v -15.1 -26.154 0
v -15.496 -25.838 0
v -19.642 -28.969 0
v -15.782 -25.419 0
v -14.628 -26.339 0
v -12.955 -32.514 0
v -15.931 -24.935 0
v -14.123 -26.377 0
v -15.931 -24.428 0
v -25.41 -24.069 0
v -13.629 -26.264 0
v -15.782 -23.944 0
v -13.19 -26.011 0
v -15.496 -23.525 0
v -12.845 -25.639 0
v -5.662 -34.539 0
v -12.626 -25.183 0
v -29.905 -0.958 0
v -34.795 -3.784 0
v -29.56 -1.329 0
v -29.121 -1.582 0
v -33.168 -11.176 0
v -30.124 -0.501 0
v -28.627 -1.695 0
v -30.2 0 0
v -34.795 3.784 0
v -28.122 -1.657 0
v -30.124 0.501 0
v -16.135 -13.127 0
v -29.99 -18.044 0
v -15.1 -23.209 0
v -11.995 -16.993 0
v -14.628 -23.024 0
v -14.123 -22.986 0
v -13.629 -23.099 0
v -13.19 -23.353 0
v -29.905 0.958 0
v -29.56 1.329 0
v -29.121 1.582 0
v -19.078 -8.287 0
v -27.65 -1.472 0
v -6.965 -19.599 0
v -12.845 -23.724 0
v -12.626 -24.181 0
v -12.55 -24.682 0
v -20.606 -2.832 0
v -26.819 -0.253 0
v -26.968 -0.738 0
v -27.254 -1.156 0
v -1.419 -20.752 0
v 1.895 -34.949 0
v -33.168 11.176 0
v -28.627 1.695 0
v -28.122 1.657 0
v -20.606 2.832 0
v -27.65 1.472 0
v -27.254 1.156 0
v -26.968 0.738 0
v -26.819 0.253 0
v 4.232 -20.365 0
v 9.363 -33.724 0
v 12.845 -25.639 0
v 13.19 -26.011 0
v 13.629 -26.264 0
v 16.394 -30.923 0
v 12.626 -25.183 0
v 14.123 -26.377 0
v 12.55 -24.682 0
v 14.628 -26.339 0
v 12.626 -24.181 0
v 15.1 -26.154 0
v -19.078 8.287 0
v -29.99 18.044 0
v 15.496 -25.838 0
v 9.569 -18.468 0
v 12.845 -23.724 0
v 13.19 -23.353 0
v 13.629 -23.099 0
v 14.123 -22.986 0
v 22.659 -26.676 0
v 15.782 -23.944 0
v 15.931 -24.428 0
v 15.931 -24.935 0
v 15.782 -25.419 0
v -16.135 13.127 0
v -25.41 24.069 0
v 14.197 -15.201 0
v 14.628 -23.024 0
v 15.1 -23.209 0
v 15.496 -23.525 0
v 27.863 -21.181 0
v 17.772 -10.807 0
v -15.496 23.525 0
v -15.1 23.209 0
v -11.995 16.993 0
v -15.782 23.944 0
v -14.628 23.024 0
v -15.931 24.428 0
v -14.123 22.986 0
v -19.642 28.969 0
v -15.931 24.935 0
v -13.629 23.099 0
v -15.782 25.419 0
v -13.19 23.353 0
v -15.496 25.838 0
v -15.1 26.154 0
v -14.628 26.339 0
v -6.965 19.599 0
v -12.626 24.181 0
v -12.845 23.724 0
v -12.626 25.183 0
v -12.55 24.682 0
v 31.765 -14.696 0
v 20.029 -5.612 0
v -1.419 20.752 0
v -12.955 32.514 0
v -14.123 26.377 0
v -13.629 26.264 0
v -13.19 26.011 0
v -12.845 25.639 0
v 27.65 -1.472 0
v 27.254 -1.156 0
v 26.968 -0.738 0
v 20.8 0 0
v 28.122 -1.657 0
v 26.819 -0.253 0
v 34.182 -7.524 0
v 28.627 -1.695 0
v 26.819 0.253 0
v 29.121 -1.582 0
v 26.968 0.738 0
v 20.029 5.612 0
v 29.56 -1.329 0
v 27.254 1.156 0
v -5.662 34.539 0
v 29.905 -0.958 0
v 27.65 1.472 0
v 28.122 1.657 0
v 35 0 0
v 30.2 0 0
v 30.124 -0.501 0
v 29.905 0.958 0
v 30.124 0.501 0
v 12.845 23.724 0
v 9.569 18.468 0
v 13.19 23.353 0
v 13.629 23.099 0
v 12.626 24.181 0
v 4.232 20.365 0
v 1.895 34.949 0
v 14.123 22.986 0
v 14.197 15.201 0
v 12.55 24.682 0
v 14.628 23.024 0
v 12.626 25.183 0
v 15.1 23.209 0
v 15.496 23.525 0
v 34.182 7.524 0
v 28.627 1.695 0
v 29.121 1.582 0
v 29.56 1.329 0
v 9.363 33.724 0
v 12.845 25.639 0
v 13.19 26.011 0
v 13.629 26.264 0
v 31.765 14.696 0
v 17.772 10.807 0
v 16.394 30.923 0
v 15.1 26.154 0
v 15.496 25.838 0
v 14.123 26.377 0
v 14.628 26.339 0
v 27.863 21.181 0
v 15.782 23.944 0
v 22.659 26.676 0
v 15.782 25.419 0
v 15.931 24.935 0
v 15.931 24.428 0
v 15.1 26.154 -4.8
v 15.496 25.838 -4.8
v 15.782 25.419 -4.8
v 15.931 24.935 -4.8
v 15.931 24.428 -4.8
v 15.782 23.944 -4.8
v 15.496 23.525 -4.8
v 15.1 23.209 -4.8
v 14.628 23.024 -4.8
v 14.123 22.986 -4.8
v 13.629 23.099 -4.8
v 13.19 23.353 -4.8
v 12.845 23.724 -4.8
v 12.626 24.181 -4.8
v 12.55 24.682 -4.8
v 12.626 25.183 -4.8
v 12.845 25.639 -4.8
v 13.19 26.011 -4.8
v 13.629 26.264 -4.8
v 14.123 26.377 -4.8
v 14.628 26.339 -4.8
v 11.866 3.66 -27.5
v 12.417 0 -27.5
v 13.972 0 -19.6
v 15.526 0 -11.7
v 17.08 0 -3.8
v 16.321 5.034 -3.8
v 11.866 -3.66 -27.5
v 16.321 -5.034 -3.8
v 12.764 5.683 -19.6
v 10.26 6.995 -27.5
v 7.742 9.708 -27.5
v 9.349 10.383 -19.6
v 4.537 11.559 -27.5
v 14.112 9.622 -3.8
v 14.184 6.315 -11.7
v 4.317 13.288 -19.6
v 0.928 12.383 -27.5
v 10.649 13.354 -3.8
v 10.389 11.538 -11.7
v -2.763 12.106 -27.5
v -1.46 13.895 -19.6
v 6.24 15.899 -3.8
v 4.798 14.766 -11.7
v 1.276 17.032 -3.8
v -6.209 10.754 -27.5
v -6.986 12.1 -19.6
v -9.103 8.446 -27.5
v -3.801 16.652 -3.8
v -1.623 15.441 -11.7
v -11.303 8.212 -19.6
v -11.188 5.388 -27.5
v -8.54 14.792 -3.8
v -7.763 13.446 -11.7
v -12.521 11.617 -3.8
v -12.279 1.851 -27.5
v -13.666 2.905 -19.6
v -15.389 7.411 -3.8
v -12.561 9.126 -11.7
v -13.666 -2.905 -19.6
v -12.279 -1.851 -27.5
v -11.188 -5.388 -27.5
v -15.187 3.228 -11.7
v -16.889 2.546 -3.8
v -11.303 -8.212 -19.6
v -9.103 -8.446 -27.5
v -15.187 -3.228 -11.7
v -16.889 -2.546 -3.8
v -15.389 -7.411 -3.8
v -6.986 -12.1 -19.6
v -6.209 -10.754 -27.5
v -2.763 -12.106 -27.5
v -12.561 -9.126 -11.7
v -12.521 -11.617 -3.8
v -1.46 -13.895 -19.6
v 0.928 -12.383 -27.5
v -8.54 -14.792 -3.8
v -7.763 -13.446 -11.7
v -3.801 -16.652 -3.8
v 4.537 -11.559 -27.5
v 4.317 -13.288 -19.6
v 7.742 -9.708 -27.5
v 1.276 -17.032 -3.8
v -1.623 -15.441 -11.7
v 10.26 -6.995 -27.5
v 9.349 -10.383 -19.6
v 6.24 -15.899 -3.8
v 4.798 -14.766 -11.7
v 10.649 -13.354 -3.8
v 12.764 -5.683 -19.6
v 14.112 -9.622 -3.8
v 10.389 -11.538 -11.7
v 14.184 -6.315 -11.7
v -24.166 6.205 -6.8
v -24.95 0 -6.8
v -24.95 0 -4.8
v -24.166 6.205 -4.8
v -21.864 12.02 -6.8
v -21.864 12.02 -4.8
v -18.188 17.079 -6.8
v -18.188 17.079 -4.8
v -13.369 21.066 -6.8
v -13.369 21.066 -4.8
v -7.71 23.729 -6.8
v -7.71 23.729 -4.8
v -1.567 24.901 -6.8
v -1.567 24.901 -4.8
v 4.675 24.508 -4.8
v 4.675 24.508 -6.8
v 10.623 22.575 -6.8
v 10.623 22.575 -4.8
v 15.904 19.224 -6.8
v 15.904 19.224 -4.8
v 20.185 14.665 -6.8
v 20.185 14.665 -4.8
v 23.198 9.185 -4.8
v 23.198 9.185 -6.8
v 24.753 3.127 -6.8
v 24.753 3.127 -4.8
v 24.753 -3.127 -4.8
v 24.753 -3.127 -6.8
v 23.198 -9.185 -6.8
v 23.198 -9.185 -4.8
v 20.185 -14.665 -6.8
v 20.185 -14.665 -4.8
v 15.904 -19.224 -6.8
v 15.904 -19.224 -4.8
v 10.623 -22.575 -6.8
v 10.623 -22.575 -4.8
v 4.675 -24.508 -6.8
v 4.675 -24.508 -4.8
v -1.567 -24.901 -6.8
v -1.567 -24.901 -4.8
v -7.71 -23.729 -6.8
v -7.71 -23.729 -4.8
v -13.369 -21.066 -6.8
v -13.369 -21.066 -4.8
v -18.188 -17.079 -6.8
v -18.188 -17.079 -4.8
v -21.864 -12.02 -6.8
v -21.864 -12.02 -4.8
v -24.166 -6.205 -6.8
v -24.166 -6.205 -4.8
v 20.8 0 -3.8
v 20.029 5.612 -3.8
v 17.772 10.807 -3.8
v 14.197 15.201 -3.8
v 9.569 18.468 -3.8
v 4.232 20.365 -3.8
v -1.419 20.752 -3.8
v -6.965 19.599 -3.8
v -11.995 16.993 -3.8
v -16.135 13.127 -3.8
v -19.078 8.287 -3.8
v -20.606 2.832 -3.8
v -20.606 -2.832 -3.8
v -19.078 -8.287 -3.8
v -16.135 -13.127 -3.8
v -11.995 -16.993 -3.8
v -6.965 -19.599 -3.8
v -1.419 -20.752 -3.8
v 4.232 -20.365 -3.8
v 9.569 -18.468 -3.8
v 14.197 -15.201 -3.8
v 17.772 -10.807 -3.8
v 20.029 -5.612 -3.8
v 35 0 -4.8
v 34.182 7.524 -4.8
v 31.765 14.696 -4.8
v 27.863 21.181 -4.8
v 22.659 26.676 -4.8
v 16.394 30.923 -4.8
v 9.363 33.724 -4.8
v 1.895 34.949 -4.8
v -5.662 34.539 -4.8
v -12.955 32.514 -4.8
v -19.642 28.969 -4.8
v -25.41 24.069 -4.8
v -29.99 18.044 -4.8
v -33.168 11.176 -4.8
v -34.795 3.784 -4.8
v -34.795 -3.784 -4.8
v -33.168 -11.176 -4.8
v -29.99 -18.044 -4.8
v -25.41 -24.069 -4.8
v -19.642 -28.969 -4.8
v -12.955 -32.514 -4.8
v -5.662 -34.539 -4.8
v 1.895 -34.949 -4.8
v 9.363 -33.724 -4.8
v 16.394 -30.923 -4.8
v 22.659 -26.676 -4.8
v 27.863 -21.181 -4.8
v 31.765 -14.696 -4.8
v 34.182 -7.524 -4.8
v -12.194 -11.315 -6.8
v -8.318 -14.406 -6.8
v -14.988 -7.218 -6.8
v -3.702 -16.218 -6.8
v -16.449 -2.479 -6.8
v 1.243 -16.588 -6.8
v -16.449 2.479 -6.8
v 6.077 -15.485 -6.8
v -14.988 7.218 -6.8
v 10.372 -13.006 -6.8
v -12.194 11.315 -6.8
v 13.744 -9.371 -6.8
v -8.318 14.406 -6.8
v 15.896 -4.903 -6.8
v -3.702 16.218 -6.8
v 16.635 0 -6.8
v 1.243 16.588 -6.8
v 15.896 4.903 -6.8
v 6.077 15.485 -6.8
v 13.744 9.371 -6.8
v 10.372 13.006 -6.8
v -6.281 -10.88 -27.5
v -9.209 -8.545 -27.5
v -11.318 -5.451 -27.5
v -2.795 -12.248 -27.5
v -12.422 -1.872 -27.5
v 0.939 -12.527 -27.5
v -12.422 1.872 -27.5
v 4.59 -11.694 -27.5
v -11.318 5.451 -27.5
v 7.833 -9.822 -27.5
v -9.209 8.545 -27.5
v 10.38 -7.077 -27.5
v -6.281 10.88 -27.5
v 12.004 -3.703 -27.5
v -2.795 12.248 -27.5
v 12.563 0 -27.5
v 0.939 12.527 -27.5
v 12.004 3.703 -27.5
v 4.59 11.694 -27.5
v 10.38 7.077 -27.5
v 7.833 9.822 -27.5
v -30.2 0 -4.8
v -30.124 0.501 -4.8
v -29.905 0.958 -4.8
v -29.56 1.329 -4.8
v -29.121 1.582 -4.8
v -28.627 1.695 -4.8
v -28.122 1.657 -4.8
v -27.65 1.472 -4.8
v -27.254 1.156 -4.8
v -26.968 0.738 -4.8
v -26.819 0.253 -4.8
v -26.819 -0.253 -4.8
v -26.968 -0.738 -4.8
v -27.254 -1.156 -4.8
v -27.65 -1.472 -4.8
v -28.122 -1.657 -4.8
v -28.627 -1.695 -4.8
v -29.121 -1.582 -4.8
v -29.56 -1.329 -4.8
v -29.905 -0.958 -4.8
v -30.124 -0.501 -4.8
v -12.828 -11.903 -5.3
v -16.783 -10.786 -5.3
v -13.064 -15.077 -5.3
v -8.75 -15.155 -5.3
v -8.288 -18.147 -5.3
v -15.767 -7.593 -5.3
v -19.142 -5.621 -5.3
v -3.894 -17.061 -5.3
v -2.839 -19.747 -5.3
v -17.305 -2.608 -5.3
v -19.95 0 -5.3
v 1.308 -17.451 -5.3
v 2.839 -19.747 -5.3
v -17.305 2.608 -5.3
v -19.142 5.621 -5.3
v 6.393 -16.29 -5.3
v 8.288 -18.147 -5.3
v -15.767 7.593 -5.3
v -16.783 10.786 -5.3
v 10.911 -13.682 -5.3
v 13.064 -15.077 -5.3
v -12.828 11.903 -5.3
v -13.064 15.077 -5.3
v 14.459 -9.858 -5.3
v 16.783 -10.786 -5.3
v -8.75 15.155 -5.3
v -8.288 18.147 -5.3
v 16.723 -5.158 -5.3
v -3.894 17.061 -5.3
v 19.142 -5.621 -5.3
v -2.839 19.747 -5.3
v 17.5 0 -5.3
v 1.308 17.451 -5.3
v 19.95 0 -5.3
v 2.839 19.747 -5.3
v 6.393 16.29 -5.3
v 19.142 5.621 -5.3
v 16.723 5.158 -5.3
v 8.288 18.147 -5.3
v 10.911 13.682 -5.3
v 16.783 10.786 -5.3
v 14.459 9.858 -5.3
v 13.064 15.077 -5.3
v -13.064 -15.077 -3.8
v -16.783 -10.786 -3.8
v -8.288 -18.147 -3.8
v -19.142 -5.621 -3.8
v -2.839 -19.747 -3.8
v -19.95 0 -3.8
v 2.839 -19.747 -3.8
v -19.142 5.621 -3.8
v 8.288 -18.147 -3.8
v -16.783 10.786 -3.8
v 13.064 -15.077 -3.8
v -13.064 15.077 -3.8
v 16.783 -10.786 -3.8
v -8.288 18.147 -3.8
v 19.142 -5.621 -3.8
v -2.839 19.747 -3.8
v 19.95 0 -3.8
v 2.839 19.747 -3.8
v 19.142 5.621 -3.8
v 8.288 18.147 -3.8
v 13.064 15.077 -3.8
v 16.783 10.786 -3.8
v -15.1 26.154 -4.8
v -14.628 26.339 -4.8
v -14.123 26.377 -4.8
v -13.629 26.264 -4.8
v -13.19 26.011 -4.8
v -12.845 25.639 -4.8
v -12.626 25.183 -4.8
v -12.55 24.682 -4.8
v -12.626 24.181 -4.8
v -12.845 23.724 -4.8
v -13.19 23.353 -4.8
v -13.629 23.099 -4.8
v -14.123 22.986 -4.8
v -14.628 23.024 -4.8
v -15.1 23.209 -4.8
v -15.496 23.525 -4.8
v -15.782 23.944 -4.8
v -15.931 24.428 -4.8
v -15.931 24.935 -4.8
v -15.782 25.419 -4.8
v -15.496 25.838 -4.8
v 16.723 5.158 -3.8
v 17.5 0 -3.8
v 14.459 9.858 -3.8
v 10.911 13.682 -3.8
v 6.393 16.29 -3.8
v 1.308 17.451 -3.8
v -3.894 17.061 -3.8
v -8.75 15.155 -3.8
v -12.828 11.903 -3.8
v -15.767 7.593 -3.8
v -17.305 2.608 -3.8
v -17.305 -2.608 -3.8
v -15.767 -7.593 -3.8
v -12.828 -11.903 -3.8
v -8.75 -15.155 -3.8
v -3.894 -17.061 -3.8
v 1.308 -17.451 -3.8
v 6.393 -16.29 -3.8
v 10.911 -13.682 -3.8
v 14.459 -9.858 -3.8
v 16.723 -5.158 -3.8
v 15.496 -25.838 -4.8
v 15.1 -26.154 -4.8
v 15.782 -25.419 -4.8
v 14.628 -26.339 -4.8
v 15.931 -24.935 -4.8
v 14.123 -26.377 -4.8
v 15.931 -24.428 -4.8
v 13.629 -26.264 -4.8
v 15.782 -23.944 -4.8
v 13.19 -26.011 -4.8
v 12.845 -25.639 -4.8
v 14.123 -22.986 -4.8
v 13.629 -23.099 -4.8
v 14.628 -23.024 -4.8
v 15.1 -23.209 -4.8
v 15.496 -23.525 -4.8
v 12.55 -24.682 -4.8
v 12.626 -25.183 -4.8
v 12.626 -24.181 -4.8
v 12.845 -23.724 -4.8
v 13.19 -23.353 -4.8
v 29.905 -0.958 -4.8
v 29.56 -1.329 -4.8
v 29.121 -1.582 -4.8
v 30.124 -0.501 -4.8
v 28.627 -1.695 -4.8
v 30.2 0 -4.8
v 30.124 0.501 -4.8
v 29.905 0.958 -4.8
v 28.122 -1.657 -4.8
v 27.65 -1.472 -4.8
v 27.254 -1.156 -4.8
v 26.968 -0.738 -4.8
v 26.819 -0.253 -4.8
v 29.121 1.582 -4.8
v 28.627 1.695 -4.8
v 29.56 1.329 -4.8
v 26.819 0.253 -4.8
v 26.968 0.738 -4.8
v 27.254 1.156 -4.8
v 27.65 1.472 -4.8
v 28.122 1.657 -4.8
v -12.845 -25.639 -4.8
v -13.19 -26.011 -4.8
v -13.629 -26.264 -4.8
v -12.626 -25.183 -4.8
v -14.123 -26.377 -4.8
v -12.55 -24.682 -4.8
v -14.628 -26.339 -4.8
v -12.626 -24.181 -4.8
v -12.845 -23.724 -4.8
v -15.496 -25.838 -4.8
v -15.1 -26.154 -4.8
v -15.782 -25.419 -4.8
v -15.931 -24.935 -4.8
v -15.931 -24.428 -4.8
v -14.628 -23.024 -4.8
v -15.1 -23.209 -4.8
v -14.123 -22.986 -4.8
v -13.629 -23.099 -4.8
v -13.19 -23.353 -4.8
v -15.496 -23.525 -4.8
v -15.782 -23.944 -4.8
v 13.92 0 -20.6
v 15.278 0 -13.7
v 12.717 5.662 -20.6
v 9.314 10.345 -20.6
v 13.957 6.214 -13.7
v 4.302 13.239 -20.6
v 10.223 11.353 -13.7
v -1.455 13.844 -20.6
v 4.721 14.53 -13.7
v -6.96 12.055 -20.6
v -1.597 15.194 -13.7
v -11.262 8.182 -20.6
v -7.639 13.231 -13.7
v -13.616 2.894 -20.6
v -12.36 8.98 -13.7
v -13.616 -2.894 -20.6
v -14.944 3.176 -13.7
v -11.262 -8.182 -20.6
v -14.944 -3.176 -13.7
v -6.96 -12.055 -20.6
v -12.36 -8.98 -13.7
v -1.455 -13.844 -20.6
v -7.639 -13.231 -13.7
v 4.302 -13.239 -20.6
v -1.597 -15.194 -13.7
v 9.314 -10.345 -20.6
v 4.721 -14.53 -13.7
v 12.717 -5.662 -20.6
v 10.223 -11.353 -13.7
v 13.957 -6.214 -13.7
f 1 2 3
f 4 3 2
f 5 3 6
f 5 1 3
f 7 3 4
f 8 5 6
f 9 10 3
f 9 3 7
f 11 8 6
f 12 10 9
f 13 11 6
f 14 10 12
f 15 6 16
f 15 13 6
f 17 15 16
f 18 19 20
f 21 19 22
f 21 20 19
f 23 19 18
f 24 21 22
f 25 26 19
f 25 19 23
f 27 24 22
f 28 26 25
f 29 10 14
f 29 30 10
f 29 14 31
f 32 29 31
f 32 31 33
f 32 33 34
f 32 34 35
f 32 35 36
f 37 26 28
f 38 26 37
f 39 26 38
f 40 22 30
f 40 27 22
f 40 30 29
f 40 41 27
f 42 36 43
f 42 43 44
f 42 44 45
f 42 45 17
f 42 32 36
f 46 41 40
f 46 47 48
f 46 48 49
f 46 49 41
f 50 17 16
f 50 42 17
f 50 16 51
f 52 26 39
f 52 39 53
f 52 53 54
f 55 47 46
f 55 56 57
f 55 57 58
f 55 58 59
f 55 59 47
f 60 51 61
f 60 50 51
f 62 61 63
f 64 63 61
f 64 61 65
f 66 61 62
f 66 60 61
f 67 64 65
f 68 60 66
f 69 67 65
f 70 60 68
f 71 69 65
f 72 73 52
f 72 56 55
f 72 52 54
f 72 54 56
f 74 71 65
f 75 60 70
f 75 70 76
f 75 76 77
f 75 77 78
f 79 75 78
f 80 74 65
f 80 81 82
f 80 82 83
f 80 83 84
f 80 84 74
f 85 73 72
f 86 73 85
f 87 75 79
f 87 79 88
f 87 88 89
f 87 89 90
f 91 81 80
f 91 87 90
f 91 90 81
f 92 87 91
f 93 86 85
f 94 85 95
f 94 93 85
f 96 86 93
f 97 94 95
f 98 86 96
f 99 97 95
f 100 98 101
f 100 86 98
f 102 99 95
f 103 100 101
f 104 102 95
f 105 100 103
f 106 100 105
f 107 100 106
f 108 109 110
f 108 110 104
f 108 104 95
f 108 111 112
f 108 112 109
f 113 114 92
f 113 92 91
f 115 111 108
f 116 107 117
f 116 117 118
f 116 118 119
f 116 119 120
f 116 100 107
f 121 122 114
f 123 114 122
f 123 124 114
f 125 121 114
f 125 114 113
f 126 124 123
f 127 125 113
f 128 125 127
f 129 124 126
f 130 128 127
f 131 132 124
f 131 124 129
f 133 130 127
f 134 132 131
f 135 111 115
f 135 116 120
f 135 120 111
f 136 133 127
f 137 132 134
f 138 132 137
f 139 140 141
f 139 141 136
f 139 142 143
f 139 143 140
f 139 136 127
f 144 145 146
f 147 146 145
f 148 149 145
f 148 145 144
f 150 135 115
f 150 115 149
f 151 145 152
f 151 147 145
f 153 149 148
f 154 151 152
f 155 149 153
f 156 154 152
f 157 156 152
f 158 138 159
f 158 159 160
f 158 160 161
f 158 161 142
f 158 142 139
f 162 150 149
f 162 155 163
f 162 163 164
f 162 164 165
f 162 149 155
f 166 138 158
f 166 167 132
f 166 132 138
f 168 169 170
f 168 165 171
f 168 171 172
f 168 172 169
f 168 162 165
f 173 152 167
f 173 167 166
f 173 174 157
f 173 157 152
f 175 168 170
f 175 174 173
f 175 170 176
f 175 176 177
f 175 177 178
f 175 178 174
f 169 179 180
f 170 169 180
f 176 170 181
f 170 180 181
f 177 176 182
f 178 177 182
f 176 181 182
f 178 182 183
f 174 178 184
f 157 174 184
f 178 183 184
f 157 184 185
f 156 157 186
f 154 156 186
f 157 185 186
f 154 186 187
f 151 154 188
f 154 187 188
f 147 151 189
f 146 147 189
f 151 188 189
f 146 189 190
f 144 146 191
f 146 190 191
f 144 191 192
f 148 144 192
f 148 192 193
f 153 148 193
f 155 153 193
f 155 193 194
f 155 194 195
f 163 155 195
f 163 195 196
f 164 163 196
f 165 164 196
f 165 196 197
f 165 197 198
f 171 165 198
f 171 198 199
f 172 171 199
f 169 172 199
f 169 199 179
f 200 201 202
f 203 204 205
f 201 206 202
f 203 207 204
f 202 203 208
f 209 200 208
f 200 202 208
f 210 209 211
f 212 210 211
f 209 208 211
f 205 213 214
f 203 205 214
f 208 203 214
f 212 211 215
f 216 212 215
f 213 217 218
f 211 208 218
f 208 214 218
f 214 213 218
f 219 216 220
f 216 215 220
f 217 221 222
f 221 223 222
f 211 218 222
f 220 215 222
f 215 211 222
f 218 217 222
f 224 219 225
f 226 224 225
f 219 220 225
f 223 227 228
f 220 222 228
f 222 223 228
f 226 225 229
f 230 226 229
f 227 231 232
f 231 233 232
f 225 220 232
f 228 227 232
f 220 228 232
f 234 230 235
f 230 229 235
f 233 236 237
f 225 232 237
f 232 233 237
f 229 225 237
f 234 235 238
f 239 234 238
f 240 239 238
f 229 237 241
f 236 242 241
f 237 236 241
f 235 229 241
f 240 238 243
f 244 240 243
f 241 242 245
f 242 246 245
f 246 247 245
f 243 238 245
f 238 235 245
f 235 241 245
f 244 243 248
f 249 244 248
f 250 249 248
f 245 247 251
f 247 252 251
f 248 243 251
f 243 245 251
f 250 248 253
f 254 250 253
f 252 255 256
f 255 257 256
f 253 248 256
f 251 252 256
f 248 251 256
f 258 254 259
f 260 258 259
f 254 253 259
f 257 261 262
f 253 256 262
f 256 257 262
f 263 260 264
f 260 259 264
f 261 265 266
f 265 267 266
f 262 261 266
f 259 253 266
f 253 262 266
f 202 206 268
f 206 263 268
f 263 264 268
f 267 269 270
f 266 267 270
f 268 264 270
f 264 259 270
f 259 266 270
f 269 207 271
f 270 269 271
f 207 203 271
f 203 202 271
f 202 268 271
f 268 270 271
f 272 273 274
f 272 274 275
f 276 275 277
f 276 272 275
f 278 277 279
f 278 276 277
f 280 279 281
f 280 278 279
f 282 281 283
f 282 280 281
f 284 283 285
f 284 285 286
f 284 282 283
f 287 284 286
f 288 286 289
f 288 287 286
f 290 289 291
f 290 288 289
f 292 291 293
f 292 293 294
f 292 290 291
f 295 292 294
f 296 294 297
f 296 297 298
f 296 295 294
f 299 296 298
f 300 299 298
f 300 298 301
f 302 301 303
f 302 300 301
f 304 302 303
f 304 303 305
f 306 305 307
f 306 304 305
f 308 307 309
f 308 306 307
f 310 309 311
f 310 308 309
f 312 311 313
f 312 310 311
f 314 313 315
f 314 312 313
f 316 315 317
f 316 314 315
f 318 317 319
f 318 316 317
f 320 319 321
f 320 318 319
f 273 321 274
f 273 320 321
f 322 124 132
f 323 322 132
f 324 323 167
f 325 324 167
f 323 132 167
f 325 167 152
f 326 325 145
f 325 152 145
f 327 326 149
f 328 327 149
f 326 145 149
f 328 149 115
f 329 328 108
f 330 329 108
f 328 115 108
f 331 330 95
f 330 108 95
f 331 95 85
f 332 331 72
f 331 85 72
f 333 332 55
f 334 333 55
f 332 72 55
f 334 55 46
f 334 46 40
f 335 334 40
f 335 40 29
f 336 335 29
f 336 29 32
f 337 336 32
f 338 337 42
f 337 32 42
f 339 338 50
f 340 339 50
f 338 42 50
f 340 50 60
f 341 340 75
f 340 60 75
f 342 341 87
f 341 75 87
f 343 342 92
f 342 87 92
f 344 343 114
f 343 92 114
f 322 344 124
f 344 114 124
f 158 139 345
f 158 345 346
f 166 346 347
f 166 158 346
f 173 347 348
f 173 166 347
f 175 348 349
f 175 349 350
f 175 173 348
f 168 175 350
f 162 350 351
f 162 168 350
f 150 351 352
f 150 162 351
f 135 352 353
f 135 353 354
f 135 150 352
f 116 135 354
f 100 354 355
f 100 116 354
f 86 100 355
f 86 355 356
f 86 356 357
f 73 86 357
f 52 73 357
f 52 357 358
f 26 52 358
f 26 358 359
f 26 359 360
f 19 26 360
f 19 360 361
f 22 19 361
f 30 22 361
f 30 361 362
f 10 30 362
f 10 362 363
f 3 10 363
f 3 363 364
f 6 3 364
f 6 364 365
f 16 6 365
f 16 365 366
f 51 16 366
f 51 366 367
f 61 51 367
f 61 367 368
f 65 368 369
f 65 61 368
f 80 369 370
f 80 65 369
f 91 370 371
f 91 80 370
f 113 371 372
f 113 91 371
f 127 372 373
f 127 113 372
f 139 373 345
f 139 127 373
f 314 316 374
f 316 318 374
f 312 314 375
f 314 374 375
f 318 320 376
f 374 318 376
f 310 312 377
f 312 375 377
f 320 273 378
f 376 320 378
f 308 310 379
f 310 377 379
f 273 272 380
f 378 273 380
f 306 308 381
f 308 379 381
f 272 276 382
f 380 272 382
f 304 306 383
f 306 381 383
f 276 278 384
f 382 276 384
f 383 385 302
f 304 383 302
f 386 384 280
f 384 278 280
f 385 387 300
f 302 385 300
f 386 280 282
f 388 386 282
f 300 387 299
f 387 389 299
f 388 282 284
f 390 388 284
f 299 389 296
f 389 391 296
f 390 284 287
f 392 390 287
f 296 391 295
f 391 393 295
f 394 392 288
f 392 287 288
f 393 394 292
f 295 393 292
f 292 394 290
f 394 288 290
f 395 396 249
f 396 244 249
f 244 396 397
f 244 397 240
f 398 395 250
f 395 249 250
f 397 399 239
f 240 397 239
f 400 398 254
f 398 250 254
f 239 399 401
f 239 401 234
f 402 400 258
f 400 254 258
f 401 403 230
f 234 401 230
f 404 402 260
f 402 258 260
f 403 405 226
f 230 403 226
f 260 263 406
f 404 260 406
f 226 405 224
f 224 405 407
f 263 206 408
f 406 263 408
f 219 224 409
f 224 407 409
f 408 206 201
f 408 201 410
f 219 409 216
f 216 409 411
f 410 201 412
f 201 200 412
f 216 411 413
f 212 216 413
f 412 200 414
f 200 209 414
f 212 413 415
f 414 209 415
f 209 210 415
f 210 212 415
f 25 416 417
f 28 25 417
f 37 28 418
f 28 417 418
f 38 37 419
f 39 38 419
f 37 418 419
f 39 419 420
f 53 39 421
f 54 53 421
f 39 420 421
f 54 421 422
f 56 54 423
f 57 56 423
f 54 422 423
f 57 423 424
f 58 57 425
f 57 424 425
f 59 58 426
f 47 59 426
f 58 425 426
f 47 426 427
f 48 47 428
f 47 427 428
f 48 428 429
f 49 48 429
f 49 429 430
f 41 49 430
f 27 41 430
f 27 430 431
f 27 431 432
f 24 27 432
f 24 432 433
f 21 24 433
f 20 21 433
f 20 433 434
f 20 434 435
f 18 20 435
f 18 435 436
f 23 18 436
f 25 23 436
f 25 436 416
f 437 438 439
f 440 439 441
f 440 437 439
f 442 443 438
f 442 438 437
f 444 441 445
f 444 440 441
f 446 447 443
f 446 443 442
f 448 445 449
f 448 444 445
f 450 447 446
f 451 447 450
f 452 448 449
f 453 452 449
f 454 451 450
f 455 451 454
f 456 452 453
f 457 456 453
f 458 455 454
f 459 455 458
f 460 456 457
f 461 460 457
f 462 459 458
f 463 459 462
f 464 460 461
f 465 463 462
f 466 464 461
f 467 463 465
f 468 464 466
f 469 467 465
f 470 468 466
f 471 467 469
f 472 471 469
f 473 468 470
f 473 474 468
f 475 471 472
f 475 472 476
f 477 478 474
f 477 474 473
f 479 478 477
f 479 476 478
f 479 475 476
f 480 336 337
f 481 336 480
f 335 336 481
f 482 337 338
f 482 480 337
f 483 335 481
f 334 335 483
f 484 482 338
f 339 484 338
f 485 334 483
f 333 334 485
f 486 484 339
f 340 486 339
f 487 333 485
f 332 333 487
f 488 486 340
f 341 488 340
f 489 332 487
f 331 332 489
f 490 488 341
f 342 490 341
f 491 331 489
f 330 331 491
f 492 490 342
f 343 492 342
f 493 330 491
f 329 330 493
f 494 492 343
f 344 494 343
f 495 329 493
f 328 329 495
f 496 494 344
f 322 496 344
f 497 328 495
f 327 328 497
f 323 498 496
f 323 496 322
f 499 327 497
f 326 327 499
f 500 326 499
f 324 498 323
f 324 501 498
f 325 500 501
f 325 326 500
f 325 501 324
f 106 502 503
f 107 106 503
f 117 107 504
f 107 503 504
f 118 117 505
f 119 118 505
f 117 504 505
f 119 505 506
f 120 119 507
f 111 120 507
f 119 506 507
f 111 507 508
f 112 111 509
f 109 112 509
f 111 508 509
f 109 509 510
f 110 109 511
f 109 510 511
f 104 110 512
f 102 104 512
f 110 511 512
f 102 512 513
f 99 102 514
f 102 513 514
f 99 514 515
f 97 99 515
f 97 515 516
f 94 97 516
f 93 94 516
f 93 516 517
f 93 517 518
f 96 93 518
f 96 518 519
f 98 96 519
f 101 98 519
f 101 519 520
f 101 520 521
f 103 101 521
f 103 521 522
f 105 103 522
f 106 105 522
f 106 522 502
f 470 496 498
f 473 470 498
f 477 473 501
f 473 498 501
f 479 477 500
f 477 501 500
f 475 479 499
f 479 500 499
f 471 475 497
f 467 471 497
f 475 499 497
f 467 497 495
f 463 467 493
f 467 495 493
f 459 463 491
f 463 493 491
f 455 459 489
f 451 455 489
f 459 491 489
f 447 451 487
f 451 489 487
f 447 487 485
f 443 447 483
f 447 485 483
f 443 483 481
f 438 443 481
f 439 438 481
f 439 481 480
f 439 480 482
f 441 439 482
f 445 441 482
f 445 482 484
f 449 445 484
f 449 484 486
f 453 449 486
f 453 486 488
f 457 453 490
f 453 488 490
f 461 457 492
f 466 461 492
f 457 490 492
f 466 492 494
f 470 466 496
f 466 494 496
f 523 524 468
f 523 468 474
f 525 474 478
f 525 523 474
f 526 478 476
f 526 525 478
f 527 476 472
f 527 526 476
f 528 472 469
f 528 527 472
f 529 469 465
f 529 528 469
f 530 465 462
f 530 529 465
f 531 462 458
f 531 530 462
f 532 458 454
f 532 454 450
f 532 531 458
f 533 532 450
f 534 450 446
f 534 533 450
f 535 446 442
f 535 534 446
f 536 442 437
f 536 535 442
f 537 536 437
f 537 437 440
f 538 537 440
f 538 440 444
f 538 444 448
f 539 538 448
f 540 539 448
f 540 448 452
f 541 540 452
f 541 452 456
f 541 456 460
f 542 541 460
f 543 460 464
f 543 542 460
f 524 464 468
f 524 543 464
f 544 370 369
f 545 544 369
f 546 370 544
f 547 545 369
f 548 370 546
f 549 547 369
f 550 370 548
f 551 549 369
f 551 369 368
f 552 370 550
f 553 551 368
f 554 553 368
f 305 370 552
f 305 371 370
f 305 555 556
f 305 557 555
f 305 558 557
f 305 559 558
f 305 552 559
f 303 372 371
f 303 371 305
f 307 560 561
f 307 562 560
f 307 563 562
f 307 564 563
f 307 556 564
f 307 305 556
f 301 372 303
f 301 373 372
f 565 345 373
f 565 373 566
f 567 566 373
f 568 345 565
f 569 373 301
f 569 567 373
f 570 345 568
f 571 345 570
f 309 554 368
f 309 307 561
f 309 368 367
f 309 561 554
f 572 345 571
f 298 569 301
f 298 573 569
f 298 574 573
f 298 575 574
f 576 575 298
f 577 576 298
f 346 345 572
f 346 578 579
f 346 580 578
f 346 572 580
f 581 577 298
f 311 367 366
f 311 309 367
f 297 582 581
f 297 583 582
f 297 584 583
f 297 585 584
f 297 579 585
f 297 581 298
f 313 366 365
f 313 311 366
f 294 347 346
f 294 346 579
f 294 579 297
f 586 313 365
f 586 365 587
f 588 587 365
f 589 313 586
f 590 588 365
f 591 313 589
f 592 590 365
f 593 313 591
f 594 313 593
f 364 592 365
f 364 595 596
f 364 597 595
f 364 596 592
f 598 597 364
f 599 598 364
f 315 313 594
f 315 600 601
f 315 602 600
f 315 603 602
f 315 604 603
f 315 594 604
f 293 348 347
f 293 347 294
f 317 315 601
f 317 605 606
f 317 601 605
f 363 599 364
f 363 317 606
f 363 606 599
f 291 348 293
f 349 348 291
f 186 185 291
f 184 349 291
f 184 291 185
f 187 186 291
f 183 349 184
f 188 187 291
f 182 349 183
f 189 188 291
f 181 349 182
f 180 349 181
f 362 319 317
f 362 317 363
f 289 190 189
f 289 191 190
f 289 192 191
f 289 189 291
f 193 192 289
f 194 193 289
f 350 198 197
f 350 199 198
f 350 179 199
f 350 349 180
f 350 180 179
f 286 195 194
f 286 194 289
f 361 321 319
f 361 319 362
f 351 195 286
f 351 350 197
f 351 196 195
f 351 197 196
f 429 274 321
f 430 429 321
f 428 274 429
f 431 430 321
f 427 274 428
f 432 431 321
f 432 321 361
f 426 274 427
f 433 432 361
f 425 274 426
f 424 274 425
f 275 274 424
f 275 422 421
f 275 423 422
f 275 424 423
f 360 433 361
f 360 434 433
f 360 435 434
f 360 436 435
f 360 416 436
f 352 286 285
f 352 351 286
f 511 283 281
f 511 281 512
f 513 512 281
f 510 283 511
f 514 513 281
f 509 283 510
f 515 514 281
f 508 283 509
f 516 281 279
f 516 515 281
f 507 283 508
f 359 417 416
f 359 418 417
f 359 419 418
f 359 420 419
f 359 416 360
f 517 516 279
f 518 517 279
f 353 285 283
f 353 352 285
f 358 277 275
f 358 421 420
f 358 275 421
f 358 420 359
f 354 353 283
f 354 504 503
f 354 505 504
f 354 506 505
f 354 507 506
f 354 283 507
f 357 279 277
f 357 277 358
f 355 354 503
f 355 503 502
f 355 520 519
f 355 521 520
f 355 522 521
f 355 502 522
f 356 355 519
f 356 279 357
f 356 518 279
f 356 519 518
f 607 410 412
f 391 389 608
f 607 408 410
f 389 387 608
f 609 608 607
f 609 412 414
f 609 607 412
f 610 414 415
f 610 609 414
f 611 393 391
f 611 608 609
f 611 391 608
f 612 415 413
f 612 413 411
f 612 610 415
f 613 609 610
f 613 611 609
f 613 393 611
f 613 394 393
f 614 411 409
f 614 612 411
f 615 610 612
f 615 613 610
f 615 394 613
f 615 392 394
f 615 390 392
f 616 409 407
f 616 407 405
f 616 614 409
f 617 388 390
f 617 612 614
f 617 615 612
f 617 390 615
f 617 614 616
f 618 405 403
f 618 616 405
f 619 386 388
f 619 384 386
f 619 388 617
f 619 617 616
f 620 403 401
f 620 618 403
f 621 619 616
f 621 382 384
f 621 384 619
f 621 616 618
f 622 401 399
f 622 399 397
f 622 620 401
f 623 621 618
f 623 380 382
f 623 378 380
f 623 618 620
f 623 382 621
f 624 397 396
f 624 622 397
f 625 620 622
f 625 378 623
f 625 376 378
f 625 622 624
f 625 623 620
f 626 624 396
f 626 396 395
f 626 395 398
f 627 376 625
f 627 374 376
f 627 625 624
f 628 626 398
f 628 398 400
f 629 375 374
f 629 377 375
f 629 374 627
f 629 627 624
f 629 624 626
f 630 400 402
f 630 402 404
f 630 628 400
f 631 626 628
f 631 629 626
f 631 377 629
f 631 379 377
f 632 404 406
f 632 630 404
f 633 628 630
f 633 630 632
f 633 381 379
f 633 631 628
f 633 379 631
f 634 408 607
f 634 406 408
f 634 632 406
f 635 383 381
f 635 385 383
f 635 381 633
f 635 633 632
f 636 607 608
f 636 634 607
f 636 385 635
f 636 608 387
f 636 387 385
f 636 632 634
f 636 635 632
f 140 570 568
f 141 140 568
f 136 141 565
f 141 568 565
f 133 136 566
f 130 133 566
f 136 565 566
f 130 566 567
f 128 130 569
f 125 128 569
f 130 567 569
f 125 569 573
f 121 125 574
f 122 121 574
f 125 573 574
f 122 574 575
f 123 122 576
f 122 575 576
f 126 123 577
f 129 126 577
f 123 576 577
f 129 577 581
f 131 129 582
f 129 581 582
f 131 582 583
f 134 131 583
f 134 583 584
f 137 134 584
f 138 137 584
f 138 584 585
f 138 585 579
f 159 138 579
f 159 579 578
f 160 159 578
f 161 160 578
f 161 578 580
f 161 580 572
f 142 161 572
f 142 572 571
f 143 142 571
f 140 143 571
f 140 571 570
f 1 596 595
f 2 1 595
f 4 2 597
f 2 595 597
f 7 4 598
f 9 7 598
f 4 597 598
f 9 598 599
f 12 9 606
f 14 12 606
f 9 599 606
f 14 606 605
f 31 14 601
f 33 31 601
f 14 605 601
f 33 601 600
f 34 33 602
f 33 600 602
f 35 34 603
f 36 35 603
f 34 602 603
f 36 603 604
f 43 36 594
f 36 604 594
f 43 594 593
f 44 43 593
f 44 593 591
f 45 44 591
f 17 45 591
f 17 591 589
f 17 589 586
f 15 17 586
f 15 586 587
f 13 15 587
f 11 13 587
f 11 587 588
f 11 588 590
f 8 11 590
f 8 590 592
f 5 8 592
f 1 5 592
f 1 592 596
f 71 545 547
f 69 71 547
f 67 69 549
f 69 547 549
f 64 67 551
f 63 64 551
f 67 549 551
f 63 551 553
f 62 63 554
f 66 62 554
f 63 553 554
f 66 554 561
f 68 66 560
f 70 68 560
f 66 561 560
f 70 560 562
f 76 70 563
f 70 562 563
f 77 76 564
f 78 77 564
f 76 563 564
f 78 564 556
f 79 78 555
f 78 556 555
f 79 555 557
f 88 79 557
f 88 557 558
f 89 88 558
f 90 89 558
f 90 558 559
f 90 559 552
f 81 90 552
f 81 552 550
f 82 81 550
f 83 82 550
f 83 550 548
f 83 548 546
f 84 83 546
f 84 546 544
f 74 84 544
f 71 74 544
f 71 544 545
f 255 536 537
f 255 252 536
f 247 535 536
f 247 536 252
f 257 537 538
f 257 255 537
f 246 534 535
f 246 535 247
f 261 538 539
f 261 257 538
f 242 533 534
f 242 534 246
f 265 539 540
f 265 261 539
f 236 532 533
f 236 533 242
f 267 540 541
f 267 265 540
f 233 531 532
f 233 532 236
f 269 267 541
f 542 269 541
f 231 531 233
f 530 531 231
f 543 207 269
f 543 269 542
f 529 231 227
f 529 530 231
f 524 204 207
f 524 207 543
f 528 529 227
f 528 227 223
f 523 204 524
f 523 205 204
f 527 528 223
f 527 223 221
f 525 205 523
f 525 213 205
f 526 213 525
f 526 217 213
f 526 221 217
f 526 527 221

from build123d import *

# Parameters (mm, degrees)
SKETCH1_R            = 35
BOSS_EXTRUDE1_DEPTH  = 6.8
M3_CLEARANCE_HOLE1_D = 3.4
CIRPATTERN1_COUNT    = 6
SKETCH5_R            = 20.8
CUT_EXTRUDE1_DEPTH   = 3.8
SKETCH6_R            = 19.95
SKETCH6_R_2          = 17.5
CUT_EXTRUDE2_DEPTH   = 1.5
SKETCH7_R            = 42.836472813
SKETCH7_R_2          = 24.95
CUT_EXTRUDE3_DEPTH   = 2
SKETCH11_R           = 16.635
BOSS_EXTRUDE5_DEPTH  = 20.7
BOSS_EXTRUDE5_DRAFT  = -11.13
SKETCH12_R           = 17.08
CUT_EXTRUDE5_DEPTH   = 28
CUT_EXTRUDE5_DRAFT   = -11.13


with BuildPart() as part:
    # Sketch1 → Boss-Extrude1 (new body)
    with BuildSketch(Plane.XY):
        Circle(SKETCH1_R)
    extrude(amount=-BOSS_EXTRUDE1_DEPTH)

    # M3 Clearance Hole1 (through all)
    with Locations(Plane.XY):
        with Locations((-28.5, 0)):
            m3_clearance_hole1 = Hole(M3_CLEARANCE_HOLE1_D / 2)

    # CirPattern1: M3 Clearance Hole1 ×6 about axis
    cirpattern1_axis = Axis((0, 0, 0), (0, 0, 1))
    for i in range(1, CIRPATTERN1_COUNT):
        add(m3_clearance_hole1.rotate(cirpattern1_axis, i * 360 / CIRPATTERN1_COUNT), mode=Mode.SUBTRACT)

    # Sketch5 → Cut-Extrude1 (cut)
    with BuildSketch(Plane.XY):
        Circle(SKETCH5_R)
    extrude(amount=-CUT_EXTRUDE1_DEPTH, mode=Mode.SUBTRACT)

    # Sketch6 → Cut-Extrude2 (cut)
    with BuildSketch(Plane.XY.offset(-3.8)):
        Circle(SKETCH6_R)
        Circle(SKETCH6_R_2, mode=Mode.SUBTRACT)
    extrude(amount=-CUT_EXTRUDE2_DEPTH, mode=Mode.SUBTRACT)

    # Sketch7 → Cut-Extrude3 (cut)
    with BuildSketch(Plane(origin=(0, 0, -6.8), x_dir=(-1, 0, 0), z_dir=(0, 0, -1))):
        Circle(SKETCH7_R)
        Circle(SKETCH7_R_2, mode=Mode.SUBTRACT)
    extrude(amount=-CUT_EXTRUDE3_DEPTH, mode=Mode.SUBTRACT)


with BuildPart() as boss_extrude5_tool:
    # Sketch11 → Boss-Extrude5 (with draft: the straight prism first)
    with BuildSketch(Plane.XY.offset(-6.8)):
        Circle(SKETCH11_R)
    extrude(amount=-BOSS_EXTRUDE5_DEPTH)
    # Boss-Extrude5: the draft: its side faces are tilted about the plane it starts from
    boss_extrude5_sides = [boss_extrude5_tool.faces().sort_by_distance(p)[0] for p in [
        (-16.635, 0, -17.15),
    ]]
    draft(boss_extrude5_sides, Plane.XY.offset(-6.8), BOSS_EXTRUDE5_DRAFT)


with BuildPart() as part_1:
    add(part.part)

    # Boss-Extrude5: add boss_extrude5_tool
    add(boss_extrude5_tool.part)


with BuildPart() as cut_extrude5_tool:
    # Sketch12 → Cut-Extrude5 (with draft: the straight prism first)
    with BuildSketch(Plane.XY.offset(-3.8)):
        Circle(SKETCH12_R)
    extrude(amount=-CUT_EXTRUDE5_DEPTH)
    # Cut-Extrude5: the draft: its side faces are tilted about the plane it starts from
    cut_extrude5_sides = [cut_extrude5_tool.faces().sort_by_distance(p)[0] for p in [
        (-17.08, 0, -17.8),
    ]]
    draft(cut_extrude5_sides, Plane.XY.offset(-3.8), CUT_EXTRUDE5_DRAFT)


with BuildPart() as part_2:
    add(part_1.part)

    # Cut-Extrude5: cut by cut_extrude5_tool
    add(cut_extrude5_tool.part, mode=Mode.SUBTRACT)


solid = part_2.part
